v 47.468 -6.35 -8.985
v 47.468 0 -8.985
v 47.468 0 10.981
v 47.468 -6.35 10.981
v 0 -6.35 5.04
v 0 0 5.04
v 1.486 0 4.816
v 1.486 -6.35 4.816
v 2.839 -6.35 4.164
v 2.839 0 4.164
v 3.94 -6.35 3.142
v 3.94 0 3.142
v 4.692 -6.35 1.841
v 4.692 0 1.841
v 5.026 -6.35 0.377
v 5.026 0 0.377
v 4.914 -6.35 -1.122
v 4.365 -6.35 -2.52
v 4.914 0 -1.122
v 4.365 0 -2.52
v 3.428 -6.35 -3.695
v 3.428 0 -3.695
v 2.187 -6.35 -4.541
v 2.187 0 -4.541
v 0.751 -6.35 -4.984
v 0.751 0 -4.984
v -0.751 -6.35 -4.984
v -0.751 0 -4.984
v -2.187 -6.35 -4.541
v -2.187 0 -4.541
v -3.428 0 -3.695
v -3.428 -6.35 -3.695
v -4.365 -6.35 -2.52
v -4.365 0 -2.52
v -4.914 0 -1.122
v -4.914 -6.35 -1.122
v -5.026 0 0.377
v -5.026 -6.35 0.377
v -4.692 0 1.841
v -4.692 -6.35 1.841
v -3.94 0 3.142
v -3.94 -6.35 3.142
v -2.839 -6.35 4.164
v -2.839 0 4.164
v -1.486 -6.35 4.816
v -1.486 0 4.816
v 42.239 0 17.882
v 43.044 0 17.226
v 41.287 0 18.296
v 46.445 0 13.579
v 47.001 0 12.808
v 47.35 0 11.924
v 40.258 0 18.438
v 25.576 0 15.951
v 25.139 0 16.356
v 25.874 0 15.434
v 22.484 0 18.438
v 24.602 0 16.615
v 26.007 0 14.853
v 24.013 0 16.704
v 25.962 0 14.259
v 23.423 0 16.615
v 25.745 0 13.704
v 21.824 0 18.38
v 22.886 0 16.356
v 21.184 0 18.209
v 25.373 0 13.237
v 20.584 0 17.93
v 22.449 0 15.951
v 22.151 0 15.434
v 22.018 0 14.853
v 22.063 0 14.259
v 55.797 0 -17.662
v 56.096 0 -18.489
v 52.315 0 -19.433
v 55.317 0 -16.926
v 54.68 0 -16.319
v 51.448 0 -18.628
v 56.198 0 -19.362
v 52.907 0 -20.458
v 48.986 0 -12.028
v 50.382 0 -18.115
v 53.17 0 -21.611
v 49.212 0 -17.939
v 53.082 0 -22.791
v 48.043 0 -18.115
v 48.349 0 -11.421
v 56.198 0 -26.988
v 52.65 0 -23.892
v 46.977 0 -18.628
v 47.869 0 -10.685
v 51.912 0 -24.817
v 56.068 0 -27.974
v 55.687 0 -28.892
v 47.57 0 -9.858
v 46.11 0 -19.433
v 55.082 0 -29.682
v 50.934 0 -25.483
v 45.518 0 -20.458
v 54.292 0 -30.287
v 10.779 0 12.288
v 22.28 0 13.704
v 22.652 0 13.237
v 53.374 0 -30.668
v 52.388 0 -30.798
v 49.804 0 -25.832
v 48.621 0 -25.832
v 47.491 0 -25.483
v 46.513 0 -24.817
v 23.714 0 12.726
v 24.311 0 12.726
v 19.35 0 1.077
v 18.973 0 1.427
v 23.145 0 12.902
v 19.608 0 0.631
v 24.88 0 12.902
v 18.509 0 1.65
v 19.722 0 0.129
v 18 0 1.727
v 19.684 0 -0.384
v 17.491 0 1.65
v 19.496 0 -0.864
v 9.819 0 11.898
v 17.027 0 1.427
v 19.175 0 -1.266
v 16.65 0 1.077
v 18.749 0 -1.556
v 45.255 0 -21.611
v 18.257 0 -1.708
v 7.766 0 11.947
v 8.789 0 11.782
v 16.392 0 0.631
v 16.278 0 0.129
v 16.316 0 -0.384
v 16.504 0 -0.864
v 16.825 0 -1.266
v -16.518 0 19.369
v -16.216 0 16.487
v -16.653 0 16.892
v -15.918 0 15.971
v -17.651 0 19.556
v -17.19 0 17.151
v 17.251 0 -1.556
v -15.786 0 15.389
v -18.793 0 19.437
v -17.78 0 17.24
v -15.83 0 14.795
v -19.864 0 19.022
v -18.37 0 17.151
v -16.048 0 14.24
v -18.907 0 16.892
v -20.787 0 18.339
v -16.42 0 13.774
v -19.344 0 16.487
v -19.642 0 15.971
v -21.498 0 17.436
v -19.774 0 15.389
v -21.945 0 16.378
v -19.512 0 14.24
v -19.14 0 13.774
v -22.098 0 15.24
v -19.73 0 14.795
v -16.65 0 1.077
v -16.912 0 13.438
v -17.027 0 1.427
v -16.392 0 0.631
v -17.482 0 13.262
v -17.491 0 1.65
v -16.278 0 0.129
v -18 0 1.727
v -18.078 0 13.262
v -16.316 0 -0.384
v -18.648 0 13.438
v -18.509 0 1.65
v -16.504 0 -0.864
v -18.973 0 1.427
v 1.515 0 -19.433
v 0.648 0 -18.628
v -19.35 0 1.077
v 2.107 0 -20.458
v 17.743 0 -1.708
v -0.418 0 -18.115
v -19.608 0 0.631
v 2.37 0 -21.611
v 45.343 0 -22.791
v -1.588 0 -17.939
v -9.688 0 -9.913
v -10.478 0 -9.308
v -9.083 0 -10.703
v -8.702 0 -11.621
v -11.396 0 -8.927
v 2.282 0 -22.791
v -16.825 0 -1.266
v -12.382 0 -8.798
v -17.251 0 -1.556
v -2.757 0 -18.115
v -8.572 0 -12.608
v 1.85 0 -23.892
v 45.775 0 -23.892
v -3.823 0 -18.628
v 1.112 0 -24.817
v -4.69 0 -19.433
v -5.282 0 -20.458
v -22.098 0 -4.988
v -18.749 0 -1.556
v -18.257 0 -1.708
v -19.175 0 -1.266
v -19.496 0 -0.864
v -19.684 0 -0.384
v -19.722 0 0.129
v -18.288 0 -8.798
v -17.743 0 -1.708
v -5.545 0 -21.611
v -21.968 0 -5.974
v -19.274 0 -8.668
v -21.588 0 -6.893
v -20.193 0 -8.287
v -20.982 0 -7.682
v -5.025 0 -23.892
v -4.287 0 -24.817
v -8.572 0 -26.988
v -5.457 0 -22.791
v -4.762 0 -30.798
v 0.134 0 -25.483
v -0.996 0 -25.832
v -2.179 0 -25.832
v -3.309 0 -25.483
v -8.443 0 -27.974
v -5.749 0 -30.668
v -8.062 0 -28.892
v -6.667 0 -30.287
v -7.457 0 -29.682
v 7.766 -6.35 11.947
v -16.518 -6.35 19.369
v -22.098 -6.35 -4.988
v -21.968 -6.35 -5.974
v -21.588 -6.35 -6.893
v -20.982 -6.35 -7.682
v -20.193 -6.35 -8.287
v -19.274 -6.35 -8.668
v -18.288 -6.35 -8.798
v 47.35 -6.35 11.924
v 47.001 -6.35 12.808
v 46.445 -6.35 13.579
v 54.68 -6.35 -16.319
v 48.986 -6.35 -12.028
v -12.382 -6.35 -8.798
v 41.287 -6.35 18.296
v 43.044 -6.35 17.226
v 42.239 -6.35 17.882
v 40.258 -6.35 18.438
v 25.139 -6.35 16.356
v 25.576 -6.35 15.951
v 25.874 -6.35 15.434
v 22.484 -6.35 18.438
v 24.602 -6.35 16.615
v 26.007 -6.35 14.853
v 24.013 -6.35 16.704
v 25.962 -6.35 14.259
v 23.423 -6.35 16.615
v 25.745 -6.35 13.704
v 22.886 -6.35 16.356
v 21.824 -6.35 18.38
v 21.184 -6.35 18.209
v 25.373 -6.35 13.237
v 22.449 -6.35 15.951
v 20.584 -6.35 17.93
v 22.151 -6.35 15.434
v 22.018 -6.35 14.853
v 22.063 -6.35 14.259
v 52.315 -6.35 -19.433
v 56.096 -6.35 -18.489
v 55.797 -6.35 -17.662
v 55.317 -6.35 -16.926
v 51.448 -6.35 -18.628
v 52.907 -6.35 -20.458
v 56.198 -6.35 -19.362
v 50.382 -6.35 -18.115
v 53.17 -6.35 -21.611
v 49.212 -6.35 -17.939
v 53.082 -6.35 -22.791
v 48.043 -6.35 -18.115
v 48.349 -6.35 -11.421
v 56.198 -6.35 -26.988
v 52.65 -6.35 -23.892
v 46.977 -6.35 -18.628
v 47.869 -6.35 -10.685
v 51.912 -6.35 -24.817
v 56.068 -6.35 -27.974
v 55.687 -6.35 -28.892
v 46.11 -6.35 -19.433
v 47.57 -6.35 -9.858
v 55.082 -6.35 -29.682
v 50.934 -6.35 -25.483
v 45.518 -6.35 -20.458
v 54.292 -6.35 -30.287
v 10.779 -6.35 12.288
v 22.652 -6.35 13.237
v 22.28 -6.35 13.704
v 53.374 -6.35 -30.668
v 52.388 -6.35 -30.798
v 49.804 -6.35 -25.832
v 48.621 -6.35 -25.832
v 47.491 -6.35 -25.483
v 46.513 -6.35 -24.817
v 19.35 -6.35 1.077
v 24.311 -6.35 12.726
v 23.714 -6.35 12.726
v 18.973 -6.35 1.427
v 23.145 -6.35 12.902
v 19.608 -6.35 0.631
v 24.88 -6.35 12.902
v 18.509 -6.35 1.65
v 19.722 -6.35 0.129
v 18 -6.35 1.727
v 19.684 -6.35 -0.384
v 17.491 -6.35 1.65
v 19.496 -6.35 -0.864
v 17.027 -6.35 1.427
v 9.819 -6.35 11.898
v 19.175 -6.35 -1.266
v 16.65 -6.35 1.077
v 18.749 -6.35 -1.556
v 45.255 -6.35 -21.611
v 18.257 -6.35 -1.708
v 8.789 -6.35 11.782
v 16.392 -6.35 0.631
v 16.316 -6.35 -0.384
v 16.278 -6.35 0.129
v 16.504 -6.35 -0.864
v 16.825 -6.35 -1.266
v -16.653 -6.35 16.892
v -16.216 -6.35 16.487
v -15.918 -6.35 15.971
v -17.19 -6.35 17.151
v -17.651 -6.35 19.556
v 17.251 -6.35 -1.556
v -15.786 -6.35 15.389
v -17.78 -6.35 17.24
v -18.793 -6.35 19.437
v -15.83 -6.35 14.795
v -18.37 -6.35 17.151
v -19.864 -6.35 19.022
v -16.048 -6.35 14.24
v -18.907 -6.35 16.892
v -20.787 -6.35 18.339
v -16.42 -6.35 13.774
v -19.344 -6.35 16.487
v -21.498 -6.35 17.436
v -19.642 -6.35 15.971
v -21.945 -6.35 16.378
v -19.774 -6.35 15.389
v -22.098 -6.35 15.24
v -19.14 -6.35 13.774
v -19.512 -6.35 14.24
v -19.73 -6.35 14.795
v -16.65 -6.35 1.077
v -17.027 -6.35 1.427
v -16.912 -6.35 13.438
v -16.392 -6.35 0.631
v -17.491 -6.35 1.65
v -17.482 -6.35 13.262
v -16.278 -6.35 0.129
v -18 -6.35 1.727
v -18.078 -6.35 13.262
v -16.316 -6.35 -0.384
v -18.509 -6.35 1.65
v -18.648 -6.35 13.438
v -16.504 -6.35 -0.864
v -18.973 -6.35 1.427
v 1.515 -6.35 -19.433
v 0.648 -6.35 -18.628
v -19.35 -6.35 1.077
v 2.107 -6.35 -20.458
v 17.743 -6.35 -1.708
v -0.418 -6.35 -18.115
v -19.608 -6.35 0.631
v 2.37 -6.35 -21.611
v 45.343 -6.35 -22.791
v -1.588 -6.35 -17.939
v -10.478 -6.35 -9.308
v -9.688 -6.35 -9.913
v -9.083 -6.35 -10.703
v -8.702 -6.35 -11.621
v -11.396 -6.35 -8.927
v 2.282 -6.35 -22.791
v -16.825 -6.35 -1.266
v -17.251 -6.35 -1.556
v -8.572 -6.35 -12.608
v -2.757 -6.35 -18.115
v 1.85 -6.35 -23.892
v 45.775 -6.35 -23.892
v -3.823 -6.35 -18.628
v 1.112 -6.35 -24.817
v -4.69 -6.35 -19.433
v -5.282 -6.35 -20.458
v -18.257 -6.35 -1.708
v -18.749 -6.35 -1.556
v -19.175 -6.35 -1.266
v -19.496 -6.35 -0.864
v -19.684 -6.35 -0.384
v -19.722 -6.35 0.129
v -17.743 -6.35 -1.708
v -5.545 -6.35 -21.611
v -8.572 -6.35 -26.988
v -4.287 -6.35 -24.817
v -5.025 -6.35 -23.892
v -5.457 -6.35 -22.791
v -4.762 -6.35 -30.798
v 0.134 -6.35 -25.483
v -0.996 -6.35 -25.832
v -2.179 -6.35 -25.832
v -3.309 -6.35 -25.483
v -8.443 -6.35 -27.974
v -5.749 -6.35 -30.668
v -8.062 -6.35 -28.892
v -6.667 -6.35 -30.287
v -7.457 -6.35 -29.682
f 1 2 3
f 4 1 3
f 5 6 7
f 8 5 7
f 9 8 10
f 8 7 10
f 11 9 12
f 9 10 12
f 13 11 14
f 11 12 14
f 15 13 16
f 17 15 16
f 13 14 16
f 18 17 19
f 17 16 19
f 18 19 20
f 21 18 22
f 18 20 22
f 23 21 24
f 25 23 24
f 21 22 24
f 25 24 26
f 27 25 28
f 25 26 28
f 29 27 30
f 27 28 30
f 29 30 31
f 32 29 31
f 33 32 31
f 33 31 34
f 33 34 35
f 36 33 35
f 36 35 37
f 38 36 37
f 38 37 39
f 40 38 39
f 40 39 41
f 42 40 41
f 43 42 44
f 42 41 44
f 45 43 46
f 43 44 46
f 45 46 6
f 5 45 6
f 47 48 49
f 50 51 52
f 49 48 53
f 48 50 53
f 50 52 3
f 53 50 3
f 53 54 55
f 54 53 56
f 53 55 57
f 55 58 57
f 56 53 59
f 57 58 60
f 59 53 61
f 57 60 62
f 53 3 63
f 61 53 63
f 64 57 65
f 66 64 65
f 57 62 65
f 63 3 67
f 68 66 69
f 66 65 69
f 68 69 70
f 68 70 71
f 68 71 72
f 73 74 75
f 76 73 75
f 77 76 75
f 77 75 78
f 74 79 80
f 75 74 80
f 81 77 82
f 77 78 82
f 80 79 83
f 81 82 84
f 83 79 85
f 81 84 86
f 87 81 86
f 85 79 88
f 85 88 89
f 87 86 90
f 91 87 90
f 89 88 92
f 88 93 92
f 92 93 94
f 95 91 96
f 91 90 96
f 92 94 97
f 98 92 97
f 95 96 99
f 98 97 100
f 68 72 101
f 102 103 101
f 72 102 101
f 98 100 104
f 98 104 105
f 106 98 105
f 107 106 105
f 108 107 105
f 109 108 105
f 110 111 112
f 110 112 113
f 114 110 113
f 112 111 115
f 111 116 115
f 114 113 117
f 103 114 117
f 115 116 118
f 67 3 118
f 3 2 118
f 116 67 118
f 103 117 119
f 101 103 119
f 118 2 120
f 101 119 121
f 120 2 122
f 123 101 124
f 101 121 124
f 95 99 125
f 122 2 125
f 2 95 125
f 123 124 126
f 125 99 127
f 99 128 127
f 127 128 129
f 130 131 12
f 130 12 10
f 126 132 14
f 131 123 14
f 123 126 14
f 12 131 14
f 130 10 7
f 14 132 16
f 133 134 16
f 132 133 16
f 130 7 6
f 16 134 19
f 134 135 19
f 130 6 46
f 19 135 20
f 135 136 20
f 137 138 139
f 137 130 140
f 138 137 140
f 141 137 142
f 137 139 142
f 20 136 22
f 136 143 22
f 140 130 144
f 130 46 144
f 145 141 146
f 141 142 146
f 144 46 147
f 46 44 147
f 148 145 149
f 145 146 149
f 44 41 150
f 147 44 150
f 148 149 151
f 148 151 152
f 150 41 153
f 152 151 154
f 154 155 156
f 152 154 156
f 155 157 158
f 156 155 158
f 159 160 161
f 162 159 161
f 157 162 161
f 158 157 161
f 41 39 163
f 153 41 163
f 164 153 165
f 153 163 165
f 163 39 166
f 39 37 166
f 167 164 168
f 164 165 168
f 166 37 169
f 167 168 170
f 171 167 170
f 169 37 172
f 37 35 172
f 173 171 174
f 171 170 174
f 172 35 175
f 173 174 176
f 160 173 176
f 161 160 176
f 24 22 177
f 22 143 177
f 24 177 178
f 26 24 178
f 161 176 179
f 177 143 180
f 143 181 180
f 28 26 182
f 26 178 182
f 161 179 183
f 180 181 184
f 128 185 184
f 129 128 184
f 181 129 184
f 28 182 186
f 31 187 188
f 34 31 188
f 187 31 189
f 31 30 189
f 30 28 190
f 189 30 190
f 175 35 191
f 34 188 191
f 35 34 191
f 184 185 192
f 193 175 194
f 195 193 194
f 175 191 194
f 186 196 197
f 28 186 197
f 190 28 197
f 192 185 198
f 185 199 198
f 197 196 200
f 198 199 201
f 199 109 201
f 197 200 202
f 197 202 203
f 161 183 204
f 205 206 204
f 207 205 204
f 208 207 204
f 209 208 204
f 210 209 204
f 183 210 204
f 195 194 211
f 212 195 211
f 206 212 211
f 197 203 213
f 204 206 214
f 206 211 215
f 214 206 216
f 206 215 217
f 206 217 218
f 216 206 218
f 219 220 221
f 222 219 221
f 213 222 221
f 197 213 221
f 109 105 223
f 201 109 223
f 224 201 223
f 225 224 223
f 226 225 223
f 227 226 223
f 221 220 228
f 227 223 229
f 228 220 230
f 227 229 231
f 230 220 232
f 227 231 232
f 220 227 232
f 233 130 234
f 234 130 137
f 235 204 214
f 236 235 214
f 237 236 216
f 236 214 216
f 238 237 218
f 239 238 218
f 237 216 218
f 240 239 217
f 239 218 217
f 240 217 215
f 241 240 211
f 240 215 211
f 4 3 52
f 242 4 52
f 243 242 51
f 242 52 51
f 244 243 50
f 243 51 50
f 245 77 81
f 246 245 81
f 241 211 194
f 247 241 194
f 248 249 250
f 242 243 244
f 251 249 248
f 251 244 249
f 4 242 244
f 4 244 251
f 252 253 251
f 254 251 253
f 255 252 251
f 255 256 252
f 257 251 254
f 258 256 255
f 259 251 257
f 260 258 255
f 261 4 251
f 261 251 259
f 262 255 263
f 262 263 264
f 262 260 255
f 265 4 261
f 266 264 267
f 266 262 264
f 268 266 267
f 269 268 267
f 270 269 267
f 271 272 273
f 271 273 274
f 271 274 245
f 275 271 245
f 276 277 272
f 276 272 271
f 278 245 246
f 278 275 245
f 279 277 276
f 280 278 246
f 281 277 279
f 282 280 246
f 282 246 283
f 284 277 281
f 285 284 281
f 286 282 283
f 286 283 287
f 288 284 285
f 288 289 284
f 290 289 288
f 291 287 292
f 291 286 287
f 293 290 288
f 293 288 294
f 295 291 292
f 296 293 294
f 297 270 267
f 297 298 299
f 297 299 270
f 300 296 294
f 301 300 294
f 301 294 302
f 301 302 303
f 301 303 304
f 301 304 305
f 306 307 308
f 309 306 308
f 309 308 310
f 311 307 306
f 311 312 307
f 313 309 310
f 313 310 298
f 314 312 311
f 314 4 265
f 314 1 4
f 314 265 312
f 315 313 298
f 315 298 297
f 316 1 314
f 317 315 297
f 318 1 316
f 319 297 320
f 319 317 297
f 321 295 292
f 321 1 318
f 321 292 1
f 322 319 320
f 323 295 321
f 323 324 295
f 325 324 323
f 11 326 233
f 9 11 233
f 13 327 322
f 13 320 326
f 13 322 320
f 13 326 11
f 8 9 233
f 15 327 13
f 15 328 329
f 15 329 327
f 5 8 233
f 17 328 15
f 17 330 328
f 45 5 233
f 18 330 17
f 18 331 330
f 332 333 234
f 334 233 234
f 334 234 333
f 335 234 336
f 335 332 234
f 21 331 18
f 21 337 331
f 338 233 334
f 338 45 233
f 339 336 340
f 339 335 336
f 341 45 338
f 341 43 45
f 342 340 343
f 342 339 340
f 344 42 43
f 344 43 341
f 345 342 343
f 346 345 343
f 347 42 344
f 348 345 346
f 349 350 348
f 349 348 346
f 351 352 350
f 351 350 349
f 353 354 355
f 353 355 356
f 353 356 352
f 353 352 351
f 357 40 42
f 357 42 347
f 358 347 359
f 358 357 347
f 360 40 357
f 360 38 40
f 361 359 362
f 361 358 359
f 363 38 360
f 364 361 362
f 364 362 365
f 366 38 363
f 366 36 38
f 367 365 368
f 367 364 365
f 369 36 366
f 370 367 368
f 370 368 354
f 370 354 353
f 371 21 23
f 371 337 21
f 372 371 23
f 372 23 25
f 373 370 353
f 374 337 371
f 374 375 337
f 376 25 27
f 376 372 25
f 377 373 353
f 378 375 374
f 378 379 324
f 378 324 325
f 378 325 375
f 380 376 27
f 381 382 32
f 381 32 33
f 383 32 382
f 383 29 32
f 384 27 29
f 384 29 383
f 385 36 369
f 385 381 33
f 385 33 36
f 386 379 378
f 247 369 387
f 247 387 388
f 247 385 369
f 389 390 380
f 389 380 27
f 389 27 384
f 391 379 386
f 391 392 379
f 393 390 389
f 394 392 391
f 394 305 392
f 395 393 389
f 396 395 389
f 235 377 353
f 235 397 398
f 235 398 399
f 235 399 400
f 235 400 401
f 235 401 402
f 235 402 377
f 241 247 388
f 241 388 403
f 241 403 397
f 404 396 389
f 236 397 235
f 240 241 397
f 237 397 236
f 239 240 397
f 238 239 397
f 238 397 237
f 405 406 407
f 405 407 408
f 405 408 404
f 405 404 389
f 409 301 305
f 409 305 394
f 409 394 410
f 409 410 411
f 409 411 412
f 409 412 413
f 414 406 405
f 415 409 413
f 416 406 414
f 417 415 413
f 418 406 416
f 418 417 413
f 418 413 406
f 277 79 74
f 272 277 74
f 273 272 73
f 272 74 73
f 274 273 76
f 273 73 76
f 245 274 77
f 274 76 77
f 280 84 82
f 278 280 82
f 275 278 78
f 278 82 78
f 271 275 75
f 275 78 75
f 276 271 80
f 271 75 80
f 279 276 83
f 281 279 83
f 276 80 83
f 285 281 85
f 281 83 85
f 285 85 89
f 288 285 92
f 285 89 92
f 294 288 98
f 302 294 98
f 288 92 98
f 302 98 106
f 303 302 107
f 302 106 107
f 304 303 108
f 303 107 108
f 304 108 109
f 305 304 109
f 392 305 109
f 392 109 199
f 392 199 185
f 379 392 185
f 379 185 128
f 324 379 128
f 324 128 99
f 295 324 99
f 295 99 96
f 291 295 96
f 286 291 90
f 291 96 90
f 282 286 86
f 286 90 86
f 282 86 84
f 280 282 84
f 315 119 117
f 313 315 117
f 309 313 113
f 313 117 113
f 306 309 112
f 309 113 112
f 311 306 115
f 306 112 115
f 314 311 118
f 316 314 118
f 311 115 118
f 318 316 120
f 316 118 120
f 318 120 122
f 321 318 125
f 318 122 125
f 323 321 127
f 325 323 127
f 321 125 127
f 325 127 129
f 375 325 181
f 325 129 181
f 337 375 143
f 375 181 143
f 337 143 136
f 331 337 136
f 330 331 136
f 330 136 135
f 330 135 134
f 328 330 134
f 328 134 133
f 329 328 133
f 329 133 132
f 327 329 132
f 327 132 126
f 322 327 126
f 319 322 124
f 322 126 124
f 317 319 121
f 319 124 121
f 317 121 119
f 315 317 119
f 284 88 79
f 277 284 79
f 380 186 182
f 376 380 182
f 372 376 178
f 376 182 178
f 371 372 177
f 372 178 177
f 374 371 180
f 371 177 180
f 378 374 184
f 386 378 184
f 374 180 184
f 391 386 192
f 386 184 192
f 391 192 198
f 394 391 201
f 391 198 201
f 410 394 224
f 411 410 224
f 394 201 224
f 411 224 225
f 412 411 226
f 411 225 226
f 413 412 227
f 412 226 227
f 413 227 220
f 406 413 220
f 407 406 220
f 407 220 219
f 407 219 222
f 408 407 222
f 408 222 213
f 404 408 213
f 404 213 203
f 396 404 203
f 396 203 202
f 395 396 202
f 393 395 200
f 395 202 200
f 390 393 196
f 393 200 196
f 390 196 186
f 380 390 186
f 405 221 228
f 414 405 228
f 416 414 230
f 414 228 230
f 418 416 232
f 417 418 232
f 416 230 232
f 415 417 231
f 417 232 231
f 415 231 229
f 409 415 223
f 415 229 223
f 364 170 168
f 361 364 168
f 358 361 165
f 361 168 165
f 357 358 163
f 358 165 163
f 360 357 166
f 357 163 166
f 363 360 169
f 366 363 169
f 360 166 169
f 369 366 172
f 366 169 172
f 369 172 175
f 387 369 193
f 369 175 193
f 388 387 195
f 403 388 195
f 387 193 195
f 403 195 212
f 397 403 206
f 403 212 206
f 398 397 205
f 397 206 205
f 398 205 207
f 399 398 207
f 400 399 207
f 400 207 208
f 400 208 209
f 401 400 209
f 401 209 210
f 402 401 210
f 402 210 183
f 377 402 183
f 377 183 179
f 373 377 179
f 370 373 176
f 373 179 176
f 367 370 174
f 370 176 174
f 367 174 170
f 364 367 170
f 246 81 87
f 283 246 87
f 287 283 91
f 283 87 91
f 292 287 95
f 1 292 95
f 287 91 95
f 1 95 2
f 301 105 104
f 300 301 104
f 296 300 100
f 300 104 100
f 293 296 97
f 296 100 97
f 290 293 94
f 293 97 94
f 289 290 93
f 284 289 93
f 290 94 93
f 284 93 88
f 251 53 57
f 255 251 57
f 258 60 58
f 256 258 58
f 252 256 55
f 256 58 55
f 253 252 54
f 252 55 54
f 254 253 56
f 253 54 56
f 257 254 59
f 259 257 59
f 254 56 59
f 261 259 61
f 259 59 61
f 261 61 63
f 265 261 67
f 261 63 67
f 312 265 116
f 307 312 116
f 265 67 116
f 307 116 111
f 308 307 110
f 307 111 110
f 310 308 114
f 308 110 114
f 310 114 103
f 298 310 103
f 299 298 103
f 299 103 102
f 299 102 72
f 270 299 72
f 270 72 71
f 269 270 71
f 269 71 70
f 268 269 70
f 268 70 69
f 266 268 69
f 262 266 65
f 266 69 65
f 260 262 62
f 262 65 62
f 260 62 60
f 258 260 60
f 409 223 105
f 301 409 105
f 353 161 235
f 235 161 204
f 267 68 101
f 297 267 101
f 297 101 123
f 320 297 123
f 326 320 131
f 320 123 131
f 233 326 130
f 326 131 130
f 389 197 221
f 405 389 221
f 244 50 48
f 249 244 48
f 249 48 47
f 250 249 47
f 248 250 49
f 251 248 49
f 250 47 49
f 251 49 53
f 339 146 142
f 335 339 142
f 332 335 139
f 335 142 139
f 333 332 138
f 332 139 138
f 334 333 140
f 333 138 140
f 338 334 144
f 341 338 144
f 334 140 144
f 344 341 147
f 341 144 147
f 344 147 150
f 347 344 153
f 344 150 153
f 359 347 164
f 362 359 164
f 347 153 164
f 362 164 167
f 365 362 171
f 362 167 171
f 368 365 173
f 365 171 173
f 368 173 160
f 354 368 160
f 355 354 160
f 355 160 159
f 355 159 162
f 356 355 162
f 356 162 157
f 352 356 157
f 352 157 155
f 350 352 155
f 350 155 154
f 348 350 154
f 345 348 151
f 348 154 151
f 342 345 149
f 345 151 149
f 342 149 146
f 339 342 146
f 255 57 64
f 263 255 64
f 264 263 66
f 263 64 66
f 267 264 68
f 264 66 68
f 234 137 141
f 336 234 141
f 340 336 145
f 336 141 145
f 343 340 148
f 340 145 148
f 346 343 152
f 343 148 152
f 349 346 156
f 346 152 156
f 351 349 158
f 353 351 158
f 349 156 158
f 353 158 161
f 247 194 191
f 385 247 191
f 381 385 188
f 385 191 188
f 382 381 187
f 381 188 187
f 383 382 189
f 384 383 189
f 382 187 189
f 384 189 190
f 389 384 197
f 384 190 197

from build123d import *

# Parameters (mm, degrees)
SKETCH4_R           = 5.04
SKETCH4_R_2         = 3.96875
SKETCH4_R_3         = 2
SKETCH4_R_4         = 1.7272
BOSS_EXTRUDE2_DEPTH = 6.35


with BuildPart() as part:
    # Sketch4 → Boss-Extrude2 (new body)
    with BuildSketch(Plane(origin=(0, 0, 0), x_dir=(1, 0, 0), z_dir=(0, 1, 0))):
        with BuildLine():
            Line((40.257702493, -18.4375), (22.483900583, -18.4375))
            ThreePointArc((22.483900583, -18.4375), (21.500464498, -18.308390309), (20.583679925, -17.929811531))
            Line((20.583679925, -17.929811531), (10.779476649, -12.288263354))
            ThreePointArc((10.779476649, -12.288263354), (9.307944036, -11.804768953), (7.765559219, -11.946980575))
            Line((7.765559219, -11.946980575), (-16.517810325, -19.369406885))
            ThreePointArc((-16.517810325, -19.369406885), (-20.348558836, -18.710969534), (-22.098, -15.24))
            Line((-22.098, -15.24), (-22.098, 4.987500122))
            ThreePointArc((-22.098, 4.987500122), (-20.982076836, 7.681576958), (-18.288, 8.797500122))
            Line((-18.288, 8.797500122), (-12.3825, 8.797500122))
            ThreePointArc((-12.3825, 8.797500122), (-9.688423164, 9.913423286), (-8.5725, 12.607500122))
            Line((-8.5725, 12.607500122), (-8.5725, 26.9875))
            ThreePointArc((-8.5725, 26.9875), (-7.456576836, 29.681576836), (-4.7625, 30.7975))
            Line((-4.7625, 30.7975), (52.3875, 30.7975))
            ThreePointArc((52.3875, 30.7975), (55.081576836, 29.681576836), (56.1975, 26.9875))
            Line((56.1975, 26.9875), (56.1975, 19.362095927))
            ThreePointArc((56.1975, 19.362095927), (55.797199918, 17.662082259), (54.680415238, 16.319294633))
            Line((54.680415238, 16.319294633), (48.985566477, 12.027918285))
            ThreePointArc((48.985566477, 12.027918285), (47.868781798, 10.685130659), (47.468481715, 8.985116992))
            Line((47.468481715, 8.985116992), (47.468481715, -10.980610773))
            ThreePointArc((47.468481715, -10.980610773), (47.203372649, -12.376980446), (46.444939319, -13.579024524))
            Line((46.444939319, -13.579024524), (43.044160097, -17.225913752))
            ThreePointArc((43.044160097, -17.225913752), (41.776936446, -18.121498883), (40.257702493, -18.4375))
        make_face()
        with Locations(Location((0, 0, 0), (0, 0, 270))):
            Circle(SKETCH4_R, mode=Mode.SUBTRACT)
        with Locations(Location((-1.5875, 21.9075, 0), (0, 0, 270))):
            Circle(SKETCH4_R_2, mode=Mode.SUBTRACT)
        with Locations(Location((49.2125, 21.9075, 0), (0, 0, 270))):
            Circle(SKETCH4_R_2, mode=Mode.SUBTRACT)
        with Locations(Location((24.012521227, -14.703599027, 0), (0, 0, 270))):
            Circle(SKETCH4_R_3, mode=Mode.SUBTRACT)
        with Locations(Location((-17.78, -15.24, 0), (0, 0, 270))):
            Circle(SKETCH4_R_3, mode=Mode.SUBTRACT)
        with Locations(Location((18.000000004, 0, 0), (0, 0, 270))):
            Circle(SKETCH4_R_4, mode=Mode.SUBTRACT)
        with Locations(Location((-18.000000004, 0, 0), (0, 0, 270))):
            Circle(SKETCH4_R_4, mode=Mode.SUBTRACT)
    extrude(amount=-BOSS_EXTRUDE2_DEPTH)


solid = part.part
